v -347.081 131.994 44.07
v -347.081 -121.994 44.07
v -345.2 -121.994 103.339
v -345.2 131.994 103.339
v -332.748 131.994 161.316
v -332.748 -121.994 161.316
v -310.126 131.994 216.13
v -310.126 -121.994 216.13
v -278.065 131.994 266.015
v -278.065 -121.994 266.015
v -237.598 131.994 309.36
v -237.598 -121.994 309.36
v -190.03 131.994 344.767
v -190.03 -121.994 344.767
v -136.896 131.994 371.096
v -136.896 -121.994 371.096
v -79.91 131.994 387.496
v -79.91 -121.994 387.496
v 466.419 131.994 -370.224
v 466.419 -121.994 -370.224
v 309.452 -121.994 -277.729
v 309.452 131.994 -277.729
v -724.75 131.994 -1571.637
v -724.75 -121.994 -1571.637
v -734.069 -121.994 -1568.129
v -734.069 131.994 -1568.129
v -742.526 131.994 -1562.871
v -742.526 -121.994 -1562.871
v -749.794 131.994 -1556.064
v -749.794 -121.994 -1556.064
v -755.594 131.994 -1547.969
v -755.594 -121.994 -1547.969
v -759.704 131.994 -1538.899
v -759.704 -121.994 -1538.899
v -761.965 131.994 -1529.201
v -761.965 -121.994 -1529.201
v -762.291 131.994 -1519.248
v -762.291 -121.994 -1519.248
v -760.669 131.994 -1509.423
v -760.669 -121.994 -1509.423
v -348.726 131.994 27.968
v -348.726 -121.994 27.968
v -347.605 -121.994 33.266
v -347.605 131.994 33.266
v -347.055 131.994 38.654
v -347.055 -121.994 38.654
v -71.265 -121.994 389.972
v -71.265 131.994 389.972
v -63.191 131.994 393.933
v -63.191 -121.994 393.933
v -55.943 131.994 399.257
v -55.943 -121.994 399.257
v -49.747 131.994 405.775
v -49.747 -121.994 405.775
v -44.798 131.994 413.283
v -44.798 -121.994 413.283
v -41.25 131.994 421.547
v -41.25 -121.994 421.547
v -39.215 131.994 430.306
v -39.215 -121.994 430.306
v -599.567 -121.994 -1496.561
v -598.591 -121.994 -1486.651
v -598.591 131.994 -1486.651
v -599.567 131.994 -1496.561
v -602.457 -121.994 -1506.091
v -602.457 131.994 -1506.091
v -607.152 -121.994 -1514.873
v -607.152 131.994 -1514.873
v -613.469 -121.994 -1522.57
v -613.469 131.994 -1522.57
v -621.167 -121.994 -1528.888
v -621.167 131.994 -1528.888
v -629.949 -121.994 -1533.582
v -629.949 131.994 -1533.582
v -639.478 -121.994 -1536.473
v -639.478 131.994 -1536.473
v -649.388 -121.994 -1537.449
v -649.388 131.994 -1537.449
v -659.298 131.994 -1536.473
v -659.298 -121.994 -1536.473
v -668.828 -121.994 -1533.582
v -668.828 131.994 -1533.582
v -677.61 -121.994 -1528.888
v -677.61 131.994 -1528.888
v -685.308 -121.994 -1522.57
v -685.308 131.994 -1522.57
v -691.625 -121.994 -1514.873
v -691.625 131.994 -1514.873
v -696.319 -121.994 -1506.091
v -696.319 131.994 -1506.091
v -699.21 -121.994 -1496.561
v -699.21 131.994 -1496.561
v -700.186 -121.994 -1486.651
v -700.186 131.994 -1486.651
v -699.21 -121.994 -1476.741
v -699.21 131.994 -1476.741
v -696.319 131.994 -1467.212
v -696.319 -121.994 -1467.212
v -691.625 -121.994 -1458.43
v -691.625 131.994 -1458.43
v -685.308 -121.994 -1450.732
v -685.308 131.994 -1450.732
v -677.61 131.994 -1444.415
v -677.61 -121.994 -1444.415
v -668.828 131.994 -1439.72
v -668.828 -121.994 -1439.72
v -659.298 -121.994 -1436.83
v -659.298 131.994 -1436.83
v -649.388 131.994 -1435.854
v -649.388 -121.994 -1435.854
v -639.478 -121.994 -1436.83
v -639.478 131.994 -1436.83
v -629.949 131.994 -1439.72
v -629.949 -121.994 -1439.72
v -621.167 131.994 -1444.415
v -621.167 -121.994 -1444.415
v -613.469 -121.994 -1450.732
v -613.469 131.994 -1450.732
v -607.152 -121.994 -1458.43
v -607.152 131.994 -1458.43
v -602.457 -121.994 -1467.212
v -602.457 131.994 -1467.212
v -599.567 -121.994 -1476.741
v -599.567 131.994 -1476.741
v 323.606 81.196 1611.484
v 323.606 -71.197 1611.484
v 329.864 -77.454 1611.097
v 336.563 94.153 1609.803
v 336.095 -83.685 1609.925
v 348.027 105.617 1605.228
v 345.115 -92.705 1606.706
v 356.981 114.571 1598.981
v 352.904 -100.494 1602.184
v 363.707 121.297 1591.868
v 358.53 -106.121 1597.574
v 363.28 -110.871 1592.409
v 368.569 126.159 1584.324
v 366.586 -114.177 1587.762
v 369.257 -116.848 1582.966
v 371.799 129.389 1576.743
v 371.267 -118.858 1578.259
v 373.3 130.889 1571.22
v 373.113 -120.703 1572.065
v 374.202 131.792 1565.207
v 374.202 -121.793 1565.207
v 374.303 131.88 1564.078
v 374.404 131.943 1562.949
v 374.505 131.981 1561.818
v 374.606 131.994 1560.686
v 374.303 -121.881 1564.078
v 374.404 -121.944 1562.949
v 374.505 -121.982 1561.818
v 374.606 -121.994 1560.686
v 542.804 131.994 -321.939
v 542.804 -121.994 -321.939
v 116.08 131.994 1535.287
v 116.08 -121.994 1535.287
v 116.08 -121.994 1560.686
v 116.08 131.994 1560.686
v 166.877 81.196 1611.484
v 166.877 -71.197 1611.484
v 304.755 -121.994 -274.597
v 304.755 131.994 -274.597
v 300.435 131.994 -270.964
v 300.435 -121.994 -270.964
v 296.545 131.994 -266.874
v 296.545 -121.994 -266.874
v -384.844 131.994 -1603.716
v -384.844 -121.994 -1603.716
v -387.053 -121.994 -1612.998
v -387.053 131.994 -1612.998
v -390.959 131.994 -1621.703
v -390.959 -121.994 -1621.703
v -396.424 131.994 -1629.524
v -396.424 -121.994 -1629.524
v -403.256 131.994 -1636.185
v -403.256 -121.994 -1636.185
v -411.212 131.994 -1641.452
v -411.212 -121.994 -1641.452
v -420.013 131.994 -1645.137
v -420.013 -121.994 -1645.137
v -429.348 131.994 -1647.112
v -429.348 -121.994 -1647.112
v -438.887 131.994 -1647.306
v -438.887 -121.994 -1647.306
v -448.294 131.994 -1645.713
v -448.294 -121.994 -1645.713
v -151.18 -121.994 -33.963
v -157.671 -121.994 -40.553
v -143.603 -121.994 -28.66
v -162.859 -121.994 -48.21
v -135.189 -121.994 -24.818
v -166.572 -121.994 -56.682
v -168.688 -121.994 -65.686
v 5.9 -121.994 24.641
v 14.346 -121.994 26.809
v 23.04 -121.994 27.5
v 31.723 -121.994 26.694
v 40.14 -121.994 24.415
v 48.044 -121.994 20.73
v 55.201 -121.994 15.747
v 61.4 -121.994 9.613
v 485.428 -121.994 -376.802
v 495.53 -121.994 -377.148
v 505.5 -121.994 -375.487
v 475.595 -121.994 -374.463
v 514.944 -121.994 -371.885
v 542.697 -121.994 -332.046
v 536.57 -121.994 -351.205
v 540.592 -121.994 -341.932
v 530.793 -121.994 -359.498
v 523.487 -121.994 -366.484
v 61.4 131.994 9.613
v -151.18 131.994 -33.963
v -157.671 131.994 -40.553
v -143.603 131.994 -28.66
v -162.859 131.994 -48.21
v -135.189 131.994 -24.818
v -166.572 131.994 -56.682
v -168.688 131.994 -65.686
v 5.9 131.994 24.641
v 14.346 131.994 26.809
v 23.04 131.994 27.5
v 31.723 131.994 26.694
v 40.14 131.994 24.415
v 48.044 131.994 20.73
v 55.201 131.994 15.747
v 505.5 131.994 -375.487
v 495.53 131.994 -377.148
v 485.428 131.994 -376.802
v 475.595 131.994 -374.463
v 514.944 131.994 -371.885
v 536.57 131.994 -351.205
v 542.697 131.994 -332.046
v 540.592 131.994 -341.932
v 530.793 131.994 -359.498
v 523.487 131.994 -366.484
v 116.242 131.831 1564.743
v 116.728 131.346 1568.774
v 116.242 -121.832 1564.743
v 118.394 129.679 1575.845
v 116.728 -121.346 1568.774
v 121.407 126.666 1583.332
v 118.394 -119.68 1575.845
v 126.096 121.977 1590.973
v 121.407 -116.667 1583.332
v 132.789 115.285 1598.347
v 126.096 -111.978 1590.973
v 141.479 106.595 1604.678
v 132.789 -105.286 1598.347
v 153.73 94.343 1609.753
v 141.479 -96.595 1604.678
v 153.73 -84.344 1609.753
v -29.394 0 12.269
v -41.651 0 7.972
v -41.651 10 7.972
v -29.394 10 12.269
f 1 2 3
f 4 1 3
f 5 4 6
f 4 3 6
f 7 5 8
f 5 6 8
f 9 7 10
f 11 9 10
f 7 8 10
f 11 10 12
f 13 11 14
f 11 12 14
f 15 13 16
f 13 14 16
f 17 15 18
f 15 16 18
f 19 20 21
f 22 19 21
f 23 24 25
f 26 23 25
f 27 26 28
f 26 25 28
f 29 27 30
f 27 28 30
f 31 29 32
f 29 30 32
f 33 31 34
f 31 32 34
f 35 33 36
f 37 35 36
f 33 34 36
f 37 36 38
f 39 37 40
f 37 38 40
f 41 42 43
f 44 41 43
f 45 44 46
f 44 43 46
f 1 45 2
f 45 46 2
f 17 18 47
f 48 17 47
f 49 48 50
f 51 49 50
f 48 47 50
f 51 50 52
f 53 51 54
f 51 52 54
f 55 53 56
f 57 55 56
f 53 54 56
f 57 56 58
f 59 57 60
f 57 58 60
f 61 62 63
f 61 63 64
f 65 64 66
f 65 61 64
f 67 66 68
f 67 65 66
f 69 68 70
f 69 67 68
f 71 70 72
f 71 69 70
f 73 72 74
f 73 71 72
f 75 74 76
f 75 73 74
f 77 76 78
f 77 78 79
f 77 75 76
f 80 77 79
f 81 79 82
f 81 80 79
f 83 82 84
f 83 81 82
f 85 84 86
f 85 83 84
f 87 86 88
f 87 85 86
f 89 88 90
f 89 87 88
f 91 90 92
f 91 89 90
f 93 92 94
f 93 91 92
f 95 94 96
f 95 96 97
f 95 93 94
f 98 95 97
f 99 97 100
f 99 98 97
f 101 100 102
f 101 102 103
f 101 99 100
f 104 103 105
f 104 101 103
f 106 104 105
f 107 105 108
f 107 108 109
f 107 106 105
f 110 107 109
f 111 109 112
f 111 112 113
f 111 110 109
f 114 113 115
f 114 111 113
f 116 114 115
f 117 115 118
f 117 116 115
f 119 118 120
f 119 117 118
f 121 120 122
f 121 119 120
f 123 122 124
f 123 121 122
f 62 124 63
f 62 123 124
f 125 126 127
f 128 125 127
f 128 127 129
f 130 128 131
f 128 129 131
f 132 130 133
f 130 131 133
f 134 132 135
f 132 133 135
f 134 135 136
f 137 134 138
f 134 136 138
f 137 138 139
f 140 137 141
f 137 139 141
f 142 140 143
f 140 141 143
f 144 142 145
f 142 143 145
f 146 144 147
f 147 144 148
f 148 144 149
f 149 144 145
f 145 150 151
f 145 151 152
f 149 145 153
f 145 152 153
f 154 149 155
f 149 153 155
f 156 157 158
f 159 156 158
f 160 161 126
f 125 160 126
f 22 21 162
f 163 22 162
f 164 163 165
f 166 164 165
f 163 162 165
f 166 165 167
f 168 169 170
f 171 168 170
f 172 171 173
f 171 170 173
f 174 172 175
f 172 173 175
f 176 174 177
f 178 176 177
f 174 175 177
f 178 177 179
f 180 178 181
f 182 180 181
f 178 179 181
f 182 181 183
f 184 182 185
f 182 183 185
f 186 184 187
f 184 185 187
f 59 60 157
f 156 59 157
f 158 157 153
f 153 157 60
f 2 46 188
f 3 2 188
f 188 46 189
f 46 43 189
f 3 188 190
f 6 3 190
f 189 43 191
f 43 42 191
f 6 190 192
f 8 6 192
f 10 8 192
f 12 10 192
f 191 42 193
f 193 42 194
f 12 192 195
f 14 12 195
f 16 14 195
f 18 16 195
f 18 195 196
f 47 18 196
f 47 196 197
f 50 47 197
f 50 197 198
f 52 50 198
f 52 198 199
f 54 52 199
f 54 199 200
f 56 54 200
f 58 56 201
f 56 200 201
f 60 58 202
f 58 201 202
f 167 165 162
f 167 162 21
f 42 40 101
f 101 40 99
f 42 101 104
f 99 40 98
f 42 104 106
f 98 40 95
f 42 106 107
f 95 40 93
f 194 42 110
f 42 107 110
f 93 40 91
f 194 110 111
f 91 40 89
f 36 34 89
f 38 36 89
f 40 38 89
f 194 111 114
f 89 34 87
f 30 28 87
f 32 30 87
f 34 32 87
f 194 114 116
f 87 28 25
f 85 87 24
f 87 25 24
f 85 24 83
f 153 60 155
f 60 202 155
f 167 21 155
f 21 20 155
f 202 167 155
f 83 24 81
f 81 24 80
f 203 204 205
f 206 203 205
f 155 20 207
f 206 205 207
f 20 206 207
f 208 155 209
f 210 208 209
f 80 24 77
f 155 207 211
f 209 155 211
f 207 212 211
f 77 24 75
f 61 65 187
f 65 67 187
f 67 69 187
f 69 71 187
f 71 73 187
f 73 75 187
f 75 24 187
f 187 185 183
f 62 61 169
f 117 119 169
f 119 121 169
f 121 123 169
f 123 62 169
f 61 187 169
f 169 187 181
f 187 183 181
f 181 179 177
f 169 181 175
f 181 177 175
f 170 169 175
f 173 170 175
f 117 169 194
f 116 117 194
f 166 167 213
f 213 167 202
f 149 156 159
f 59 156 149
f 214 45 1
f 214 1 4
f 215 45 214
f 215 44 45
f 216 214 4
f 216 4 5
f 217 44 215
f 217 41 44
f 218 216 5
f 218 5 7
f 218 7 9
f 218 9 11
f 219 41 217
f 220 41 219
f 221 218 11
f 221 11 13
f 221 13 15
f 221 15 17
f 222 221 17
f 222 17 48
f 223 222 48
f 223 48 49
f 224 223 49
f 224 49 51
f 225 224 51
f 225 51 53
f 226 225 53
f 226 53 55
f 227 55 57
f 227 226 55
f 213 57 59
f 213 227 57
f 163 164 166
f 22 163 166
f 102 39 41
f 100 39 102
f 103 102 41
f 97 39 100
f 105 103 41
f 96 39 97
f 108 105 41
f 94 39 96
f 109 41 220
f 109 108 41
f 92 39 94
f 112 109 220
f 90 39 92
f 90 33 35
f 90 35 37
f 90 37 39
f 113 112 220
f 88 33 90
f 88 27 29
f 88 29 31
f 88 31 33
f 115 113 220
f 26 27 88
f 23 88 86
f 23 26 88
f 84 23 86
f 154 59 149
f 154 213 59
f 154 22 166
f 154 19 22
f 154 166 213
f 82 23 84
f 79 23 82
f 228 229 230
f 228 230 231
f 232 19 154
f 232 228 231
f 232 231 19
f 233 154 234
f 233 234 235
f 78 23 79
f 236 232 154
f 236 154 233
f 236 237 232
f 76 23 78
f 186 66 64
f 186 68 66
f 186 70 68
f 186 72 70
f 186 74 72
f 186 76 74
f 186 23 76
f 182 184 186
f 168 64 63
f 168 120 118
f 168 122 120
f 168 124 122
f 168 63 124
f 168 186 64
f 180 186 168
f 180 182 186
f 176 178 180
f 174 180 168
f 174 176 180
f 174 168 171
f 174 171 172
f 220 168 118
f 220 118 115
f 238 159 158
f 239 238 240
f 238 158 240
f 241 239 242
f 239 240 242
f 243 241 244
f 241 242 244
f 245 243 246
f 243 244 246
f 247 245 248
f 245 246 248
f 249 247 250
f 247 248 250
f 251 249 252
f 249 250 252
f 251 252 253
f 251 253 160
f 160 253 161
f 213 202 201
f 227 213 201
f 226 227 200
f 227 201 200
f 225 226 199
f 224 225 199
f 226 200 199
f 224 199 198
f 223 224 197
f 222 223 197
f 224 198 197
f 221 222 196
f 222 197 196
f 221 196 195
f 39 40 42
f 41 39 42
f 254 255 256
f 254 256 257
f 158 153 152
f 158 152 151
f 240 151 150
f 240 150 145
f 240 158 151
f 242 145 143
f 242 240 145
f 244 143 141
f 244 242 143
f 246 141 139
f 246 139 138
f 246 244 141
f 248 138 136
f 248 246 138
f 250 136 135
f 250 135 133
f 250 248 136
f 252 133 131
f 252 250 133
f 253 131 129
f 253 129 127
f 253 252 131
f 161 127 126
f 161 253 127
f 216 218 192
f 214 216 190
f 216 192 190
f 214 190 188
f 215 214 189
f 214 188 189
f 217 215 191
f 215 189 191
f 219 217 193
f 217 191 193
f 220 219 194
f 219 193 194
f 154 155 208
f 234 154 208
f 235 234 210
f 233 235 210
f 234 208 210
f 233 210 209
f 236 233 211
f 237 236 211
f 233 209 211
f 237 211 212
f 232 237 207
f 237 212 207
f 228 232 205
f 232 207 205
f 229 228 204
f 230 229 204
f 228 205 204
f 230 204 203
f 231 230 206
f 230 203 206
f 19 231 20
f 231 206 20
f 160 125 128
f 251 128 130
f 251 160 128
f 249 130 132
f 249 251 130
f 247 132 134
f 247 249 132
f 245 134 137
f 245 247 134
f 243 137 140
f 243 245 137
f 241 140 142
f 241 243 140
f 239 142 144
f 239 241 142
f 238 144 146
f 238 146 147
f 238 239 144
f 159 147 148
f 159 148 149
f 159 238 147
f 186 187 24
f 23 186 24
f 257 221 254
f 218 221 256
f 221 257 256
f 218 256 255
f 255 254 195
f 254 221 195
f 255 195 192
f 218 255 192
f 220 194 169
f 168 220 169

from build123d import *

# Parameters (mm, degrees)
BOSS_EXTRUDE1_DEPTH = 10
SKETCH3_R           = 2
CUT_EXTRUDE1_DEPTH  = 115.049114878
FILLET1_R           = 2
SCALE1_OUTLINE_R    = 2
SCALE1_DEPTH        = 10
SCALE1_START        = -121.994217108
SCALE1_2_OUTLINE_R  = 50.797559682
SCALE1_2_DEPTH      = 253.987798408
SCALE1_START_2      = 115
SCALE1_3_DEPTH      = 259.606010788


with BuildPart() as part:
    # Sketch2 → Boss-Extrude1 (new body)
    with BuildSketch(Plane(origin=(0, 0, 0), x_dir=(1, 0, 0), z_dir=(0, 1, 0))):
        with BuildLine():
            Line((-34.878175659, 26.752034212), (-49.878175659, 22.732796325))
            Line((-49.878175659, 22.732796325), (-33.054937728, -40.052382384))
            ThreePointArc((-33.054937728, -40.052382384), (-30.014485308, -49.526217776), (-21.165547534, -54.075306501))
            Line((-21.165547534, -54.075306501), (-14.841209972, -99.075306501))
            Line((-14.841209972, -99.075306501), (-14.841209972, -102.075306501))
            Line((-14.841209972, -102.075306501), (-4.841209972, -102.075306501))
            Line((-4.841209972, -102.075306501), (2.306162059, -22.075306501))
            Line((2.306162059, -22.075306501), (-7.517843313, -27.864196663))
            Line((-7.517843313, -27.864196663), (-17.883562238, -40.052382384))
            Line((-17.883562238, -40.052382384), (-25.883562238, -37.247965788))
            Line((-25.883562238, -37.247965788), (-34.878175659, 26.752034212))
        make_face()
    extrude(amount=BOSS_EXTRUDE1_DEPTH)

    # Sketch3 → Cut-Extrude1 (cut, through all)
    with BuildSketch(Plane(origin=(0, 10, 0), x_dir=(1, 0, 0), z_dir=(0, 1, 0))):
        with Locations(Location((-44.979196174, 19.9043692, 0), (0, 0, 270))):
            Circle(SKETCH3_R)
    extrude(amount=-CUT_EXTRUDE1_DEPTH, mode=Mode.SUBTRACT)

    # Fillet1
    fillet1_edges = [part.edges().sort_by_distance(p)[0] for p in [
        (-9.841209972, 0, 102.075306501),
        (-25.883562238, 5, 37.247965788),
        (-17.883562238, 5, 40.052382384),
        (-7.517843313, 5, 27.864196663),
        (2.306162059, 5, 22.075306501),
        (-4.841209972, 5, 102.075306501),
        (-14.841209972, 5, 102.075306501),
        (-21.165547534, 5, 54.075306501),
        (-33.054937728, 5, 40.052382384),
        (-49.878175659, 5, -22.732796325),
        (-34.878175659, 5, -26.752034212),
        (-9.841209972, 10, 102.075306501),
    ]]
    fillet(fillet1_edges, radius=FILLET1_R)

    # Scale1: read off the stored shape, not the designer's step
    # Scale1 outline → Scale1 (cut)
    with BuildSketch(Plane(origin=(0, 0, 0), x_dir=(1, 0, 0), z_dir=(0, 1, 0))):
        with BuildLine():
            Line((-49.360537569, 20.800944672), (-41.650784025, -7.972247266))
            Line((-41.650784025, -7.972247266), (-29.394150026, -12.26883574))
            Line((-29.394150026, -12.26883574), (-34.56356251, 24.513445333))
            ThreePointArc((-34.56356251, 24.513445333), (-35.440224677, 25.902870776), (-37.061736738, 26.166950784))
            Line((-37.061736738, 26.166950784), (-47.946324007, 23.250434415))
            ThreePointArc((-47.946324007, 23.250434415), (-49.160736724, 22.318582762), (-49.360537569, 20.800944672))
        make_face()
        with Locations((-44.979196174, 19.9043692)):
            Circle(SCALE1_OUTLINE_R, mode=Mode.SUBTRACT)
    extrude(amount=SCALE1_DEPTH, mode=Mode.SUBTRACT)

    # Scale1 2 outline → Scale1 2 (add)
    with BuildSketch(Plane(origin=(0, 0, 0), x_dir=(1, 0, 0), z_dir=(0, 1, 0)).offset(SCALE1_START)):
        with BuildLine():
            Line((-168.687755361, 65.685601537), (-384.843840888, 1603.716067804))
            ThreePointArc((-384.843840888, 1603.716067804), (-407.109990259, 1639.005778716), (-448.294418101, 1645.713088711))
            Line((-448.294418101, 1645.713088711), (-724.74965381, 1571.637131559))
            ThreePointArc((-724.74965381, 1571.637131559), (-755.594255054, 1547.969236591), (-760.668952729, 1509.42308086))
            Line((-760.668952729, 1509.42308086), (-348.726244774, -27.968035036))
            ThreePointArc((-348.726244774, -27.968035036), (-347.258373754, -35.952877877), (-347.081334171, -44.069590112))
            ThreePointArc((-347.081334171, -44.069590112), (-278.064712008, -266.014644418), (-79.909995387, -387.4955464))
            ThreePointArc((-79.909995387, -387.4955464), (-52.700625622, -402.378257255), (-39.215096586, -430.306475817))
            Line((-39.215096586, -430.306475817), (116.079849164, -1535.287430848))
            Line((116.079849164, -1535.287430848), (116.079849164, -1560.686210689))
            ThreePointArc((116.079849164, -1560.686210689), (130.958109927, -1596.605509607), (166.877408846, -1611.48377037))
            Line((166.877408846, -1611.48377037), (323.606120492, -1611.48377037))
            ThreePointArc((323.606120492, -1611.48377037), (357.890000816, -1598.169641955), (374.202152259, -1565.206568967))
            Line((374.202152259, -1565.206568967), (542.803771441, 321.938731014))
            ThreePointArc((542.803771441, 321.938731014), (519.350127439, 369.397217524), (466.419055413, 370.223639258))
            Line((466.419055413, 370.223639258), (309.451536343, 277.729010804))
            ThreePointArc((309.451536343, 277.729010804), (302.544435993, 272.840902782), (296.544589882, 266.874037447))
            Line((296.544589882, 266.874037447), (61.399717742, -9.613236968))
            ThreePointArc((61.399717742, -9.613236968), (35.980525842, -25.735570803), (5.899516763, -24.641103846))
            Line((5.899516763, -24.641103846), (-135.189124295, 24.817811952))
            ThreePointArc((-135.189124295, 24.817811952), (-157.670776916, 40.553007666), (-168.687755361, 65.685601537))
        make_face()
        with Locations((-649.388227221, 1486.651157832)):
            Circle(SCALE1_2_OUTLINE_R, mode=Mode.SUBTRACT)
    extrude(amount=SCALE1_2_DEPTH)

    # Scale1 3 outline → Scale1 3 (cut)
    with BuildSketch(Plane.YZ.offset(SCALE1_START_2)):
        with BuildLine():
            Line((131.9935813, 1611.48377037), (81.196021618, 1611.48377037))
            ThreePointArc((81.196021618, 1611.48377037), (117.115320537, 1596.605509607), (131.9935813, 1560.686210689))
            Line((131.9935813, 1560.686210689), (131.9935813, 1611.48377037))
        make_face()
        with BuildLine():
            ThreePointArc((-121.994217108, 1560.686210689), (-107.115956345, 1596.605509607), (-71.196657426, 1611.48377037))
            Line((-71.196657426, 1611.48377037), (-121.994217108, 1611.48377037))
            Line((-121.994217108, 1611.48377037), (-121.994217108, 1560.686210689))
        make_face()
    extrude(amount=SCALE1_3_DEPTH, mode=Mode.SUBTRACT)


solid = part.part
